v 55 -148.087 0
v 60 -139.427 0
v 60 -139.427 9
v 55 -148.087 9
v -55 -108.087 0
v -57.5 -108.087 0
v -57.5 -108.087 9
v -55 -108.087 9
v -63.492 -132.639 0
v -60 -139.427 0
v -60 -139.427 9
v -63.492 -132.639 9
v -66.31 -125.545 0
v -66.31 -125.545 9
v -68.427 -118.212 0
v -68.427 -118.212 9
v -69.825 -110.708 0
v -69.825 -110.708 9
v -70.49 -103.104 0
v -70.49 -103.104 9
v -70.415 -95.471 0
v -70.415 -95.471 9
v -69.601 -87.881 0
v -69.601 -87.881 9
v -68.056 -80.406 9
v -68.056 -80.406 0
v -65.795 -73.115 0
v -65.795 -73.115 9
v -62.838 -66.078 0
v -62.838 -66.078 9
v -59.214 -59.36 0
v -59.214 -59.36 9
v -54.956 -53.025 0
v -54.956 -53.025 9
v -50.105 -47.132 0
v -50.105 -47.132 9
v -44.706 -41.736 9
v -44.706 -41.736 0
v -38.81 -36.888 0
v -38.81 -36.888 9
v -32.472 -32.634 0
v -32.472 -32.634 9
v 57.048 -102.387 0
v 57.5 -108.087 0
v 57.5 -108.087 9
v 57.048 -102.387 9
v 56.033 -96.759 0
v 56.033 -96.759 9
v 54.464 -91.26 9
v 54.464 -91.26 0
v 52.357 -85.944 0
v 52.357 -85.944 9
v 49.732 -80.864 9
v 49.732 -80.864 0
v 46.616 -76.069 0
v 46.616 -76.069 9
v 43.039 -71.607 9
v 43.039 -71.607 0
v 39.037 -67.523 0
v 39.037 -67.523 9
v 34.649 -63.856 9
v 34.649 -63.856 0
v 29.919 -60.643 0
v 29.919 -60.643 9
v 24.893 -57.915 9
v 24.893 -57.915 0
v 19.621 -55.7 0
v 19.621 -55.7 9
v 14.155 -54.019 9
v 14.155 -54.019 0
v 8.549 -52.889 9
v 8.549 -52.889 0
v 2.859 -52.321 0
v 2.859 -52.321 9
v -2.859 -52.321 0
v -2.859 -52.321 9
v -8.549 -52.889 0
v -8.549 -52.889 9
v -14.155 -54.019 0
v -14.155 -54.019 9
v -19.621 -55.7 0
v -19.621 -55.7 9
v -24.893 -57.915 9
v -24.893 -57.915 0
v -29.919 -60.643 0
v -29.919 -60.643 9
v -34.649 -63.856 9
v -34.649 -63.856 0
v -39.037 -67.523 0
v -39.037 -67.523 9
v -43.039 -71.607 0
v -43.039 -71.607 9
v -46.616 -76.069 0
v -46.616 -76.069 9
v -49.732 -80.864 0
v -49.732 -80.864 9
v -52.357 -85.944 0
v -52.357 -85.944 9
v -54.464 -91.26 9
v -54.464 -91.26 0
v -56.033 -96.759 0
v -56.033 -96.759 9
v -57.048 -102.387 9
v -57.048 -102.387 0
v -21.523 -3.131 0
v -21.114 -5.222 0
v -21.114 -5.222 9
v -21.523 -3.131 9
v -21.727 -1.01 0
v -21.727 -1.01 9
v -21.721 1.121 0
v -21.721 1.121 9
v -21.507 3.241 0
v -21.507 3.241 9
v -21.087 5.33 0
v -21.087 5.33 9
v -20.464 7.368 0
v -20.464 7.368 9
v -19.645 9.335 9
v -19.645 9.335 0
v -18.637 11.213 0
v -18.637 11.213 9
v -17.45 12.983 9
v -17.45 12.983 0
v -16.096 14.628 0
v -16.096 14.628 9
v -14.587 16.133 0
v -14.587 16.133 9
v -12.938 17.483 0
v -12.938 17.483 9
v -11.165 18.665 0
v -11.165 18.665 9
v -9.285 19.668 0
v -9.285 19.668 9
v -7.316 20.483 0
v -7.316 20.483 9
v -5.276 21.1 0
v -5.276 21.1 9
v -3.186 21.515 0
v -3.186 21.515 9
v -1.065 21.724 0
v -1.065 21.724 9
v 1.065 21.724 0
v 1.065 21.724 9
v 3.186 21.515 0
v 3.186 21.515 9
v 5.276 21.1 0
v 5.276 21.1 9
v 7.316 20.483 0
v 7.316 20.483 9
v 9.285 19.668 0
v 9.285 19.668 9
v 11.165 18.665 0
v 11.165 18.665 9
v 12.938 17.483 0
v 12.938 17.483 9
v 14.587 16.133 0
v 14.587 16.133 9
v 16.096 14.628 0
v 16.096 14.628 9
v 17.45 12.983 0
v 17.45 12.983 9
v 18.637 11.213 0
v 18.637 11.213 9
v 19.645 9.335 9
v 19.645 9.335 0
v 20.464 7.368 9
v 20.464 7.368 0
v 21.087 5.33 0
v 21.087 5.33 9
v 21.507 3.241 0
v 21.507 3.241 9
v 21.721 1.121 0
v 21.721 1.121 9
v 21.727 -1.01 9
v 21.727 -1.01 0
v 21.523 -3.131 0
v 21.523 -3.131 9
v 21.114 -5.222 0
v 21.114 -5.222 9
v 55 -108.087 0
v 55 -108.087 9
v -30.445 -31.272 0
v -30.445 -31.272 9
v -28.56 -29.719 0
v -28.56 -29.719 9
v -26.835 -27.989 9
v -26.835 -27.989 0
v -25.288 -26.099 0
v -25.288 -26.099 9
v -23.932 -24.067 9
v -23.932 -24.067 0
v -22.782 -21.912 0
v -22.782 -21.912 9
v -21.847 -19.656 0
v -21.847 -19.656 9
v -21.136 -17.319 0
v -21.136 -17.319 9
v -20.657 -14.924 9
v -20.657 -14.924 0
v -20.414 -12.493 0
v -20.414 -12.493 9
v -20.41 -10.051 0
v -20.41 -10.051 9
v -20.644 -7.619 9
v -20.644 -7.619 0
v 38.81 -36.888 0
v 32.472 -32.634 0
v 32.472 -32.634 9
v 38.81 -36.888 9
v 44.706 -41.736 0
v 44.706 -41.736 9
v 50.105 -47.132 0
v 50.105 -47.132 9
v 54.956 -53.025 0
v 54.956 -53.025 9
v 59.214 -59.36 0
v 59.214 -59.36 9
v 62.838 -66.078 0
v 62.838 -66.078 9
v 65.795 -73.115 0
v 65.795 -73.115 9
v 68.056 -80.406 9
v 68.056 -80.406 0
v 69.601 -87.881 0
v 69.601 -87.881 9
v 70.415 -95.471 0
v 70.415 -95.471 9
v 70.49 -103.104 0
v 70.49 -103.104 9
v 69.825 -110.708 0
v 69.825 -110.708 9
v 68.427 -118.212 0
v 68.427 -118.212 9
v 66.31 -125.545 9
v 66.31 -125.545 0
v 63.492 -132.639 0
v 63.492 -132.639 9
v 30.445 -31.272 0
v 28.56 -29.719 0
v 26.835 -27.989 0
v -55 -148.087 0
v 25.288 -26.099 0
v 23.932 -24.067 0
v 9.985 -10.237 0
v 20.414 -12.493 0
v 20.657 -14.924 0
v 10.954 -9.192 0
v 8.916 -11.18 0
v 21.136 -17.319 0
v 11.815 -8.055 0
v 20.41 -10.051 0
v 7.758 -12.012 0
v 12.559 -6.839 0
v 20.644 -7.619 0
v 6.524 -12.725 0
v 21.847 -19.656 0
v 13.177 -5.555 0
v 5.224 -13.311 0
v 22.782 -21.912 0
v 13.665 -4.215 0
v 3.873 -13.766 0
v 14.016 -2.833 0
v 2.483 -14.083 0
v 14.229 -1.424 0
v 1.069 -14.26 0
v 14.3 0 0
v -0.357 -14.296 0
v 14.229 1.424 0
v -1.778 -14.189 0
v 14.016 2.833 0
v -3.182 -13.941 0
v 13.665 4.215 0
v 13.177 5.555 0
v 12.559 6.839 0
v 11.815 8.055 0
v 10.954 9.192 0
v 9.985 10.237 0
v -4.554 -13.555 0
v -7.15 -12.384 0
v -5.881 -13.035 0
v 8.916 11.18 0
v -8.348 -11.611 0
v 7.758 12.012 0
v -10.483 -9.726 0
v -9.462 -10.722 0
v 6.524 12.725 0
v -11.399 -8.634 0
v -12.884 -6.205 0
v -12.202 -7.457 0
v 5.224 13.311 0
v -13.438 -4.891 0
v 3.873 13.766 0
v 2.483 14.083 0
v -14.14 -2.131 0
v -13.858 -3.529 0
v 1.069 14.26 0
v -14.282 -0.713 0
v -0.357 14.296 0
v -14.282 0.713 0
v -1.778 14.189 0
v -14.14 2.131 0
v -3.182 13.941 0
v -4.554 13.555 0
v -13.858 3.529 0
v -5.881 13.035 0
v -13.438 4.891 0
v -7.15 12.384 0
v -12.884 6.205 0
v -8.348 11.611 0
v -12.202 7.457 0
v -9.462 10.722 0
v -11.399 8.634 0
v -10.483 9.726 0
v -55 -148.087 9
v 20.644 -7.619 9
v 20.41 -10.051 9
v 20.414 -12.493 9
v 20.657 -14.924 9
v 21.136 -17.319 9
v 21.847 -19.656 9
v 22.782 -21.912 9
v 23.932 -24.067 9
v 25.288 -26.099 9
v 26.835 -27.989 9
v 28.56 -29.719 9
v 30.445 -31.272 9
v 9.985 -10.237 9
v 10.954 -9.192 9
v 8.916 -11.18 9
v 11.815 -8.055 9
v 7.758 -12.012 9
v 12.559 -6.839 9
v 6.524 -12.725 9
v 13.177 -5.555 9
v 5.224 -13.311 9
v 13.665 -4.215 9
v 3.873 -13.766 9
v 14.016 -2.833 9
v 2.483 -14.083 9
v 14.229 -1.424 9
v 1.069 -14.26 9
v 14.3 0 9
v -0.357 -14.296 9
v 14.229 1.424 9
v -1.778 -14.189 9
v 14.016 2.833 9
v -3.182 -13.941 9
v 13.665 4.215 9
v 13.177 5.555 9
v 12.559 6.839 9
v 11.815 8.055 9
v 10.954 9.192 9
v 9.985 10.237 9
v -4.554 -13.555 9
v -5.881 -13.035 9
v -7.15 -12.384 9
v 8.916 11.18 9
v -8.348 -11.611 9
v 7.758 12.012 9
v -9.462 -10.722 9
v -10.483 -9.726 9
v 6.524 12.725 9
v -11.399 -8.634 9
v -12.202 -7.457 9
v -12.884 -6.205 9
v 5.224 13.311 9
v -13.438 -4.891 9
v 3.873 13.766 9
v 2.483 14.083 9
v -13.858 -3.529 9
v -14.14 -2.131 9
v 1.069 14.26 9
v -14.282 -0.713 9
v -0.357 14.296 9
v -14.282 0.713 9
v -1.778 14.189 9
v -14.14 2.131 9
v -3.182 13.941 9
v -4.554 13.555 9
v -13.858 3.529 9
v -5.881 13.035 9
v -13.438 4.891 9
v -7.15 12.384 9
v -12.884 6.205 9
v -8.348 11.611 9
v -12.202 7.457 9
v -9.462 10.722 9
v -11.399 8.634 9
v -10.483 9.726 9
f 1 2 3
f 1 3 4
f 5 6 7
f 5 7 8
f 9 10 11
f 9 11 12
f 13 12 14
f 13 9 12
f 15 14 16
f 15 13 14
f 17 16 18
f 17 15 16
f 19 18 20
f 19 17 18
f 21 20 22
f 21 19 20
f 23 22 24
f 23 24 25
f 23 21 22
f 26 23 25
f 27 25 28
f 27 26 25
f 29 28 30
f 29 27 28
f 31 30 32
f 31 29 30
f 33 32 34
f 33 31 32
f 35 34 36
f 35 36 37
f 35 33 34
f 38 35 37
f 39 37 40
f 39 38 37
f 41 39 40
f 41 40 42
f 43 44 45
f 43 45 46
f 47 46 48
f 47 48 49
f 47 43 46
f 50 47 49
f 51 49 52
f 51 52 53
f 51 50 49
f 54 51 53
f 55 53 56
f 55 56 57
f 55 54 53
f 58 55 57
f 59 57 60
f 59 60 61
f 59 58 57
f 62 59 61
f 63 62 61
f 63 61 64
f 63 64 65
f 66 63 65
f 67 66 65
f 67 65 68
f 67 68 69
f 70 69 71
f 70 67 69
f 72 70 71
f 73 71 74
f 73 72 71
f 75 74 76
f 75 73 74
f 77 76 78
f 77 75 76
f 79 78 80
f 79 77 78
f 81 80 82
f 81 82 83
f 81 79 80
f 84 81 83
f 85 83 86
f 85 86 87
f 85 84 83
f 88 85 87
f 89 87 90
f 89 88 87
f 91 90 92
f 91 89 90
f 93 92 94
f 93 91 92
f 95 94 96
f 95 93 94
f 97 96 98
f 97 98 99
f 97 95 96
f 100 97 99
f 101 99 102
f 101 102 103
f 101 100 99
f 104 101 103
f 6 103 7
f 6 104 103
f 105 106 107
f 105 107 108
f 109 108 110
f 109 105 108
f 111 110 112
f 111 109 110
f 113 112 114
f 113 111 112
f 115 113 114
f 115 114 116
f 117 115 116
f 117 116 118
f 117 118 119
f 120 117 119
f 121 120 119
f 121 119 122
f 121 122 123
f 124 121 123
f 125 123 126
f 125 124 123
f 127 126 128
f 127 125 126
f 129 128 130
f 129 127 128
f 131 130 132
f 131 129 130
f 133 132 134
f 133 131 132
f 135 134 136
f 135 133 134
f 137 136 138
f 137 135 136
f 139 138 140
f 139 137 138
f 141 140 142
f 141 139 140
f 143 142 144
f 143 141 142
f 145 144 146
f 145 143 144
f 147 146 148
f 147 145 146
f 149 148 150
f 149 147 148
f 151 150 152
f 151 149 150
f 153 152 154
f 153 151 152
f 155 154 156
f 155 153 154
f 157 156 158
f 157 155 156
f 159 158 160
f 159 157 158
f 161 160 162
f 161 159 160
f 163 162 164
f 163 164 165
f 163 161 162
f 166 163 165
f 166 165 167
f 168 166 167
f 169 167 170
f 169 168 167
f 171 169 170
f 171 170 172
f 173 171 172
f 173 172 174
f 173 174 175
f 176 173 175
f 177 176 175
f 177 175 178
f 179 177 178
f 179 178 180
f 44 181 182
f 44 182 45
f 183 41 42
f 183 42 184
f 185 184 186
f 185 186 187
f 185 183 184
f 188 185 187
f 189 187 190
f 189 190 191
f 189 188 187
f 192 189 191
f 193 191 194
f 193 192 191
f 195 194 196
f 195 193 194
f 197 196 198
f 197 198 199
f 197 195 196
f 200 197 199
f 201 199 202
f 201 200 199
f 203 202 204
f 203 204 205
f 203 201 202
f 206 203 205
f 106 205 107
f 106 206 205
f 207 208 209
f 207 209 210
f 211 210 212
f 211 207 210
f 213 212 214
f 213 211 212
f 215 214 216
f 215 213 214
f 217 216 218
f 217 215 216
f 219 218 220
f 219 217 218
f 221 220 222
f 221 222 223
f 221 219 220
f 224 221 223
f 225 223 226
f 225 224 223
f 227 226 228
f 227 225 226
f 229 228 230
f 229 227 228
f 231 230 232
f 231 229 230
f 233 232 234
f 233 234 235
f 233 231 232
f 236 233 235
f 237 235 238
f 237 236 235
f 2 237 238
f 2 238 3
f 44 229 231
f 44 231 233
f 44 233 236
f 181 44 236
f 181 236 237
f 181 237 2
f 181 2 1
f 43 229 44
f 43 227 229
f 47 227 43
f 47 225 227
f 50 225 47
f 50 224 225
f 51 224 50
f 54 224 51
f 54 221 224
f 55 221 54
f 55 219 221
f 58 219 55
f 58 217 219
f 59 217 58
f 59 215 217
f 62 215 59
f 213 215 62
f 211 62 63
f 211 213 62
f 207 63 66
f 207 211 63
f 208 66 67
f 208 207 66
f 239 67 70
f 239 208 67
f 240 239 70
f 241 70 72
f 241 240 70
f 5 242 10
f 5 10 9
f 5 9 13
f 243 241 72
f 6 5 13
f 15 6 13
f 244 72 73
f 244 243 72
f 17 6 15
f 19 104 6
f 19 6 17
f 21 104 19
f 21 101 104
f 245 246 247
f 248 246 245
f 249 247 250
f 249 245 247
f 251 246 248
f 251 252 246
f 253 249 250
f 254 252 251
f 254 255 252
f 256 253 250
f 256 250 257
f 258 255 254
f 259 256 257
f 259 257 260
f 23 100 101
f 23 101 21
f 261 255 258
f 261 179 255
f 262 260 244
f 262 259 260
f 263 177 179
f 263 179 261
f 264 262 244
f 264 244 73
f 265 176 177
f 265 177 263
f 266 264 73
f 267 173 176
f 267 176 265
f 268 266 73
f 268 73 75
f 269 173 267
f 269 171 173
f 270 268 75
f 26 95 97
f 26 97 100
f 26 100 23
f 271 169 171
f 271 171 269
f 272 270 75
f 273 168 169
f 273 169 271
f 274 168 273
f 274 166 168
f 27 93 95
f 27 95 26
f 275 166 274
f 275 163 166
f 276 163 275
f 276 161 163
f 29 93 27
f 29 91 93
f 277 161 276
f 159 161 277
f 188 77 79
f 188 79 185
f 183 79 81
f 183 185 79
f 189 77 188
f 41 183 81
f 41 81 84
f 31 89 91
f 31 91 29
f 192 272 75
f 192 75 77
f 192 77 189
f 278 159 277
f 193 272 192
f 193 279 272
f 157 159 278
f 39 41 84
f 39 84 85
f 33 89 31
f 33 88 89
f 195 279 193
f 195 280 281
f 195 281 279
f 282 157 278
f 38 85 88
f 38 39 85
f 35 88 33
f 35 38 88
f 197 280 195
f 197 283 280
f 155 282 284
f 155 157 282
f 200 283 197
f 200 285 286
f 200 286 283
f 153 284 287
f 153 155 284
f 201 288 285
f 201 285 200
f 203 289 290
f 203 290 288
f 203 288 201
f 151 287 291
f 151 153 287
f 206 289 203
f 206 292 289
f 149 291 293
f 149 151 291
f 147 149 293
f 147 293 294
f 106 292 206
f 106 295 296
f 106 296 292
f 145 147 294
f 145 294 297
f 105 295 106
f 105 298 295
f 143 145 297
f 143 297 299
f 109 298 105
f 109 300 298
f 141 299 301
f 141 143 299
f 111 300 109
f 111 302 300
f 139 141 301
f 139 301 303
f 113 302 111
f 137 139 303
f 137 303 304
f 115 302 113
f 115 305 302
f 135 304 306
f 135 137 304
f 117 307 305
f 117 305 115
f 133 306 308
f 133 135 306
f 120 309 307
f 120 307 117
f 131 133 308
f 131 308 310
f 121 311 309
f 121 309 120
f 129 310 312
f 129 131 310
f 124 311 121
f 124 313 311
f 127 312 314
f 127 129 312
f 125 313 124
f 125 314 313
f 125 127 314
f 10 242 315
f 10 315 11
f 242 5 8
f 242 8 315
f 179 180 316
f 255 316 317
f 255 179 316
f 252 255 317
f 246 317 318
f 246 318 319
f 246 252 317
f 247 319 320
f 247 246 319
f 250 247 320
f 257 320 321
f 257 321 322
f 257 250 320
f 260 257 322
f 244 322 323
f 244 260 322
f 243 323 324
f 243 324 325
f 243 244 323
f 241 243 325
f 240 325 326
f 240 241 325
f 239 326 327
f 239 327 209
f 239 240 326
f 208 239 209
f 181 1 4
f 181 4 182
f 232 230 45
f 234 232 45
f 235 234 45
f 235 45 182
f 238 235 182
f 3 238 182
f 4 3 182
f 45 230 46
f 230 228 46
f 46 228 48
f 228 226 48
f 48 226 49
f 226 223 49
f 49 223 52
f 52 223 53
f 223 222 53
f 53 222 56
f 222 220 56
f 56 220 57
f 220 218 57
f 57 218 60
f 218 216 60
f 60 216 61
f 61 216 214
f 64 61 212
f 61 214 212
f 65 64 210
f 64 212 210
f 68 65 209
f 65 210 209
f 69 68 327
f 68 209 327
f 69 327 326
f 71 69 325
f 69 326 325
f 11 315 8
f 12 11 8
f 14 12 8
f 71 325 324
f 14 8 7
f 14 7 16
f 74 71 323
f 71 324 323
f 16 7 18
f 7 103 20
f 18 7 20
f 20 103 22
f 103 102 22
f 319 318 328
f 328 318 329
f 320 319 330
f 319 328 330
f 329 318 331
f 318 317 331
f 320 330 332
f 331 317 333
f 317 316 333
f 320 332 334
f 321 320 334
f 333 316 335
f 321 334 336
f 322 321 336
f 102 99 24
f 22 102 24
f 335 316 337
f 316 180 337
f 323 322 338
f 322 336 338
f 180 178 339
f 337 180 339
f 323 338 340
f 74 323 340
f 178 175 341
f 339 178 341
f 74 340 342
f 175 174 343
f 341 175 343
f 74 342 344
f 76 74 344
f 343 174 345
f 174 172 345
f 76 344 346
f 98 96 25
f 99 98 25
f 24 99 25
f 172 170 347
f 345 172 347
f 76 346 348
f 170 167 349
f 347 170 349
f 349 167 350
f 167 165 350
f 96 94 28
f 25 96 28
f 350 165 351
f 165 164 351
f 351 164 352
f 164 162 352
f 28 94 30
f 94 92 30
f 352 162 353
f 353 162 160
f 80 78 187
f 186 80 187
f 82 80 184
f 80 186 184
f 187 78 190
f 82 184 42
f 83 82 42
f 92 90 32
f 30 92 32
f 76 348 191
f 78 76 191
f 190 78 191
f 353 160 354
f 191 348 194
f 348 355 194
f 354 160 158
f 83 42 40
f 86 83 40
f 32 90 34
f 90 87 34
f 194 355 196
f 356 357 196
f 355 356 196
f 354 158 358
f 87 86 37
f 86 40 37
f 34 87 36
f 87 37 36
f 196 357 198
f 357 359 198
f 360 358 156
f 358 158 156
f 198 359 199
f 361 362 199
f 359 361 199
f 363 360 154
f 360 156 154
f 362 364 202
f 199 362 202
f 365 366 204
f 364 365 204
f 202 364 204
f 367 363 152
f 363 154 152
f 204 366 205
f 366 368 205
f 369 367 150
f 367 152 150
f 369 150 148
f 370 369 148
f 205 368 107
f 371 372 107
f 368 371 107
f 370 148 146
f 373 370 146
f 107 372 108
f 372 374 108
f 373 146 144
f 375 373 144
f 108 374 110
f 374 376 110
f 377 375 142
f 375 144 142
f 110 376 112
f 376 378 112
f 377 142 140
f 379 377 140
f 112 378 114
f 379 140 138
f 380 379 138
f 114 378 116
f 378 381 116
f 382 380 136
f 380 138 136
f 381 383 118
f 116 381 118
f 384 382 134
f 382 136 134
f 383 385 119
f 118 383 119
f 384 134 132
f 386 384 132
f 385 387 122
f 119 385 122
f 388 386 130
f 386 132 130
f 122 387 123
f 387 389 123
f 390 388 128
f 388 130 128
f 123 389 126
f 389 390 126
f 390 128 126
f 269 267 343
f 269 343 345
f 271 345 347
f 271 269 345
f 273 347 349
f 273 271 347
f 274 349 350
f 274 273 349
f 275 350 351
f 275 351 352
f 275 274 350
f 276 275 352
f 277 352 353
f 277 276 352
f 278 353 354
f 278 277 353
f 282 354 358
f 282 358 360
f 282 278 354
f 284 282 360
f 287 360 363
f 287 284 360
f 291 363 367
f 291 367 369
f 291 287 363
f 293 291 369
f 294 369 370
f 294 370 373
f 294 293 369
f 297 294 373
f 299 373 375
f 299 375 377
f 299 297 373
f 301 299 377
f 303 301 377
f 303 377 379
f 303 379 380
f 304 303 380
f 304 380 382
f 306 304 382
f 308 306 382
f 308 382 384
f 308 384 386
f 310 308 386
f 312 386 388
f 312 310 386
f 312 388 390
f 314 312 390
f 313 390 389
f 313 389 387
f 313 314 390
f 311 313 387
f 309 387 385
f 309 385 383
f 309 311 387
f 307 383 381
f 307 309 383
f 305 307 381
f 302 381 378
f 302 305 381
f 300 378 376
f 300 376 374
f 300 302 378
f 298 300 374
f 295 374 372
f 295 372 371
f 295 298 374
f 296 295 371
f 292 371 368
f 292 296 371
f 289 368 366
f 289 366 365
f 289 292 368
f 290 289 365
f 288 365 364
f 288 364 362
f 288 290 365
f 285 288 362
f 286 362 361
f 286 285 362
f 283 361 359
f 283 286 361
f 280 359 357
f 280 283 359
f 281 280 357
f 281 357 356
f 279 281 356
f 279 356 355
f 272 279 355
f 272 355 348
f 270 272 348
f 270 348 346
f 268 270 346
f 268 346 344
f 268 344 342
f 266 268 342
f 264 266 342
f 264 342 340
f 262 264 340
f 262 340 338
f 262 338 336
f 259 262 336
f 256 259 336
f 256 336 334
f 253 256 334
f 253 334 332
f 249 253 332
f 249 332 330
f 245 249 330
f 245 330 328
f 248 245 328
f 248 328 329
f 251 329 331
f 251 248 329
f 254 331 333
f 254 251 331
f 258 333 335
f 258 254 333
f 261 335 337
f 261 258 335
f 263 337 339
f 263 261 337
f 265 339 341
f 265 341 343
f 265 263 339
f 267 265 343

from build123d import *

# Parameters (mm, degrees)
SKETCH_1_R      = 14.3
EXTRUDE_1_DEPTH = 9


with BuildPart() as part:
    # Sketch 1 → Бобышка-Вытянуть1 (new body)
    with BuildSketch(Plane.XY):
        with BuildLine():
            Line((-55, -108.08739831), (-55, -148.08739831))
            Line((-55, -148.08739831), (-60, -139.427144273))
            ThreePointArc((-60, -139.427144273), (-68.056385746, -80.406003175), (-32.47221146, -32.633971733))
            ThreePointArc((-32.47221146, -32.633971733), (-22.286605842, -20.795527399), (-21.113695467, -5.222486356))
            ThreePointArc((-21.113695467, -5.222486356), (0, 21.75), (21.113695467, -5.222486356))
            ThreePointArc((21.113695467, -5.222486356), (22.286605842, -20.795527399), (32.47221146, -32.633971733))
            ThreePointArc((32.47221146, -32.633971733), (68.056385746, -80.406003175), (60, -139.427144273))
            Line((60, -139.427144273), (55, -148.08739831))
            Line((55, -148.08739831), (55, -108.08739831))
            Line((55, -108.08739831), (57.5, -108.08739831))
            ThreePointArc((57.5, -108.08739831), (0, -52.25), (-57.5, -108.08739831))
            Line((-57.5, -108.08739831), (-55, -108.08739831))
        make_face()
        Circle(SKETCH_1_R, mode=Mode.SUBTRACT)
    extrude(amount=EXTRUDE_1_DEPTH)


solid = part.part
